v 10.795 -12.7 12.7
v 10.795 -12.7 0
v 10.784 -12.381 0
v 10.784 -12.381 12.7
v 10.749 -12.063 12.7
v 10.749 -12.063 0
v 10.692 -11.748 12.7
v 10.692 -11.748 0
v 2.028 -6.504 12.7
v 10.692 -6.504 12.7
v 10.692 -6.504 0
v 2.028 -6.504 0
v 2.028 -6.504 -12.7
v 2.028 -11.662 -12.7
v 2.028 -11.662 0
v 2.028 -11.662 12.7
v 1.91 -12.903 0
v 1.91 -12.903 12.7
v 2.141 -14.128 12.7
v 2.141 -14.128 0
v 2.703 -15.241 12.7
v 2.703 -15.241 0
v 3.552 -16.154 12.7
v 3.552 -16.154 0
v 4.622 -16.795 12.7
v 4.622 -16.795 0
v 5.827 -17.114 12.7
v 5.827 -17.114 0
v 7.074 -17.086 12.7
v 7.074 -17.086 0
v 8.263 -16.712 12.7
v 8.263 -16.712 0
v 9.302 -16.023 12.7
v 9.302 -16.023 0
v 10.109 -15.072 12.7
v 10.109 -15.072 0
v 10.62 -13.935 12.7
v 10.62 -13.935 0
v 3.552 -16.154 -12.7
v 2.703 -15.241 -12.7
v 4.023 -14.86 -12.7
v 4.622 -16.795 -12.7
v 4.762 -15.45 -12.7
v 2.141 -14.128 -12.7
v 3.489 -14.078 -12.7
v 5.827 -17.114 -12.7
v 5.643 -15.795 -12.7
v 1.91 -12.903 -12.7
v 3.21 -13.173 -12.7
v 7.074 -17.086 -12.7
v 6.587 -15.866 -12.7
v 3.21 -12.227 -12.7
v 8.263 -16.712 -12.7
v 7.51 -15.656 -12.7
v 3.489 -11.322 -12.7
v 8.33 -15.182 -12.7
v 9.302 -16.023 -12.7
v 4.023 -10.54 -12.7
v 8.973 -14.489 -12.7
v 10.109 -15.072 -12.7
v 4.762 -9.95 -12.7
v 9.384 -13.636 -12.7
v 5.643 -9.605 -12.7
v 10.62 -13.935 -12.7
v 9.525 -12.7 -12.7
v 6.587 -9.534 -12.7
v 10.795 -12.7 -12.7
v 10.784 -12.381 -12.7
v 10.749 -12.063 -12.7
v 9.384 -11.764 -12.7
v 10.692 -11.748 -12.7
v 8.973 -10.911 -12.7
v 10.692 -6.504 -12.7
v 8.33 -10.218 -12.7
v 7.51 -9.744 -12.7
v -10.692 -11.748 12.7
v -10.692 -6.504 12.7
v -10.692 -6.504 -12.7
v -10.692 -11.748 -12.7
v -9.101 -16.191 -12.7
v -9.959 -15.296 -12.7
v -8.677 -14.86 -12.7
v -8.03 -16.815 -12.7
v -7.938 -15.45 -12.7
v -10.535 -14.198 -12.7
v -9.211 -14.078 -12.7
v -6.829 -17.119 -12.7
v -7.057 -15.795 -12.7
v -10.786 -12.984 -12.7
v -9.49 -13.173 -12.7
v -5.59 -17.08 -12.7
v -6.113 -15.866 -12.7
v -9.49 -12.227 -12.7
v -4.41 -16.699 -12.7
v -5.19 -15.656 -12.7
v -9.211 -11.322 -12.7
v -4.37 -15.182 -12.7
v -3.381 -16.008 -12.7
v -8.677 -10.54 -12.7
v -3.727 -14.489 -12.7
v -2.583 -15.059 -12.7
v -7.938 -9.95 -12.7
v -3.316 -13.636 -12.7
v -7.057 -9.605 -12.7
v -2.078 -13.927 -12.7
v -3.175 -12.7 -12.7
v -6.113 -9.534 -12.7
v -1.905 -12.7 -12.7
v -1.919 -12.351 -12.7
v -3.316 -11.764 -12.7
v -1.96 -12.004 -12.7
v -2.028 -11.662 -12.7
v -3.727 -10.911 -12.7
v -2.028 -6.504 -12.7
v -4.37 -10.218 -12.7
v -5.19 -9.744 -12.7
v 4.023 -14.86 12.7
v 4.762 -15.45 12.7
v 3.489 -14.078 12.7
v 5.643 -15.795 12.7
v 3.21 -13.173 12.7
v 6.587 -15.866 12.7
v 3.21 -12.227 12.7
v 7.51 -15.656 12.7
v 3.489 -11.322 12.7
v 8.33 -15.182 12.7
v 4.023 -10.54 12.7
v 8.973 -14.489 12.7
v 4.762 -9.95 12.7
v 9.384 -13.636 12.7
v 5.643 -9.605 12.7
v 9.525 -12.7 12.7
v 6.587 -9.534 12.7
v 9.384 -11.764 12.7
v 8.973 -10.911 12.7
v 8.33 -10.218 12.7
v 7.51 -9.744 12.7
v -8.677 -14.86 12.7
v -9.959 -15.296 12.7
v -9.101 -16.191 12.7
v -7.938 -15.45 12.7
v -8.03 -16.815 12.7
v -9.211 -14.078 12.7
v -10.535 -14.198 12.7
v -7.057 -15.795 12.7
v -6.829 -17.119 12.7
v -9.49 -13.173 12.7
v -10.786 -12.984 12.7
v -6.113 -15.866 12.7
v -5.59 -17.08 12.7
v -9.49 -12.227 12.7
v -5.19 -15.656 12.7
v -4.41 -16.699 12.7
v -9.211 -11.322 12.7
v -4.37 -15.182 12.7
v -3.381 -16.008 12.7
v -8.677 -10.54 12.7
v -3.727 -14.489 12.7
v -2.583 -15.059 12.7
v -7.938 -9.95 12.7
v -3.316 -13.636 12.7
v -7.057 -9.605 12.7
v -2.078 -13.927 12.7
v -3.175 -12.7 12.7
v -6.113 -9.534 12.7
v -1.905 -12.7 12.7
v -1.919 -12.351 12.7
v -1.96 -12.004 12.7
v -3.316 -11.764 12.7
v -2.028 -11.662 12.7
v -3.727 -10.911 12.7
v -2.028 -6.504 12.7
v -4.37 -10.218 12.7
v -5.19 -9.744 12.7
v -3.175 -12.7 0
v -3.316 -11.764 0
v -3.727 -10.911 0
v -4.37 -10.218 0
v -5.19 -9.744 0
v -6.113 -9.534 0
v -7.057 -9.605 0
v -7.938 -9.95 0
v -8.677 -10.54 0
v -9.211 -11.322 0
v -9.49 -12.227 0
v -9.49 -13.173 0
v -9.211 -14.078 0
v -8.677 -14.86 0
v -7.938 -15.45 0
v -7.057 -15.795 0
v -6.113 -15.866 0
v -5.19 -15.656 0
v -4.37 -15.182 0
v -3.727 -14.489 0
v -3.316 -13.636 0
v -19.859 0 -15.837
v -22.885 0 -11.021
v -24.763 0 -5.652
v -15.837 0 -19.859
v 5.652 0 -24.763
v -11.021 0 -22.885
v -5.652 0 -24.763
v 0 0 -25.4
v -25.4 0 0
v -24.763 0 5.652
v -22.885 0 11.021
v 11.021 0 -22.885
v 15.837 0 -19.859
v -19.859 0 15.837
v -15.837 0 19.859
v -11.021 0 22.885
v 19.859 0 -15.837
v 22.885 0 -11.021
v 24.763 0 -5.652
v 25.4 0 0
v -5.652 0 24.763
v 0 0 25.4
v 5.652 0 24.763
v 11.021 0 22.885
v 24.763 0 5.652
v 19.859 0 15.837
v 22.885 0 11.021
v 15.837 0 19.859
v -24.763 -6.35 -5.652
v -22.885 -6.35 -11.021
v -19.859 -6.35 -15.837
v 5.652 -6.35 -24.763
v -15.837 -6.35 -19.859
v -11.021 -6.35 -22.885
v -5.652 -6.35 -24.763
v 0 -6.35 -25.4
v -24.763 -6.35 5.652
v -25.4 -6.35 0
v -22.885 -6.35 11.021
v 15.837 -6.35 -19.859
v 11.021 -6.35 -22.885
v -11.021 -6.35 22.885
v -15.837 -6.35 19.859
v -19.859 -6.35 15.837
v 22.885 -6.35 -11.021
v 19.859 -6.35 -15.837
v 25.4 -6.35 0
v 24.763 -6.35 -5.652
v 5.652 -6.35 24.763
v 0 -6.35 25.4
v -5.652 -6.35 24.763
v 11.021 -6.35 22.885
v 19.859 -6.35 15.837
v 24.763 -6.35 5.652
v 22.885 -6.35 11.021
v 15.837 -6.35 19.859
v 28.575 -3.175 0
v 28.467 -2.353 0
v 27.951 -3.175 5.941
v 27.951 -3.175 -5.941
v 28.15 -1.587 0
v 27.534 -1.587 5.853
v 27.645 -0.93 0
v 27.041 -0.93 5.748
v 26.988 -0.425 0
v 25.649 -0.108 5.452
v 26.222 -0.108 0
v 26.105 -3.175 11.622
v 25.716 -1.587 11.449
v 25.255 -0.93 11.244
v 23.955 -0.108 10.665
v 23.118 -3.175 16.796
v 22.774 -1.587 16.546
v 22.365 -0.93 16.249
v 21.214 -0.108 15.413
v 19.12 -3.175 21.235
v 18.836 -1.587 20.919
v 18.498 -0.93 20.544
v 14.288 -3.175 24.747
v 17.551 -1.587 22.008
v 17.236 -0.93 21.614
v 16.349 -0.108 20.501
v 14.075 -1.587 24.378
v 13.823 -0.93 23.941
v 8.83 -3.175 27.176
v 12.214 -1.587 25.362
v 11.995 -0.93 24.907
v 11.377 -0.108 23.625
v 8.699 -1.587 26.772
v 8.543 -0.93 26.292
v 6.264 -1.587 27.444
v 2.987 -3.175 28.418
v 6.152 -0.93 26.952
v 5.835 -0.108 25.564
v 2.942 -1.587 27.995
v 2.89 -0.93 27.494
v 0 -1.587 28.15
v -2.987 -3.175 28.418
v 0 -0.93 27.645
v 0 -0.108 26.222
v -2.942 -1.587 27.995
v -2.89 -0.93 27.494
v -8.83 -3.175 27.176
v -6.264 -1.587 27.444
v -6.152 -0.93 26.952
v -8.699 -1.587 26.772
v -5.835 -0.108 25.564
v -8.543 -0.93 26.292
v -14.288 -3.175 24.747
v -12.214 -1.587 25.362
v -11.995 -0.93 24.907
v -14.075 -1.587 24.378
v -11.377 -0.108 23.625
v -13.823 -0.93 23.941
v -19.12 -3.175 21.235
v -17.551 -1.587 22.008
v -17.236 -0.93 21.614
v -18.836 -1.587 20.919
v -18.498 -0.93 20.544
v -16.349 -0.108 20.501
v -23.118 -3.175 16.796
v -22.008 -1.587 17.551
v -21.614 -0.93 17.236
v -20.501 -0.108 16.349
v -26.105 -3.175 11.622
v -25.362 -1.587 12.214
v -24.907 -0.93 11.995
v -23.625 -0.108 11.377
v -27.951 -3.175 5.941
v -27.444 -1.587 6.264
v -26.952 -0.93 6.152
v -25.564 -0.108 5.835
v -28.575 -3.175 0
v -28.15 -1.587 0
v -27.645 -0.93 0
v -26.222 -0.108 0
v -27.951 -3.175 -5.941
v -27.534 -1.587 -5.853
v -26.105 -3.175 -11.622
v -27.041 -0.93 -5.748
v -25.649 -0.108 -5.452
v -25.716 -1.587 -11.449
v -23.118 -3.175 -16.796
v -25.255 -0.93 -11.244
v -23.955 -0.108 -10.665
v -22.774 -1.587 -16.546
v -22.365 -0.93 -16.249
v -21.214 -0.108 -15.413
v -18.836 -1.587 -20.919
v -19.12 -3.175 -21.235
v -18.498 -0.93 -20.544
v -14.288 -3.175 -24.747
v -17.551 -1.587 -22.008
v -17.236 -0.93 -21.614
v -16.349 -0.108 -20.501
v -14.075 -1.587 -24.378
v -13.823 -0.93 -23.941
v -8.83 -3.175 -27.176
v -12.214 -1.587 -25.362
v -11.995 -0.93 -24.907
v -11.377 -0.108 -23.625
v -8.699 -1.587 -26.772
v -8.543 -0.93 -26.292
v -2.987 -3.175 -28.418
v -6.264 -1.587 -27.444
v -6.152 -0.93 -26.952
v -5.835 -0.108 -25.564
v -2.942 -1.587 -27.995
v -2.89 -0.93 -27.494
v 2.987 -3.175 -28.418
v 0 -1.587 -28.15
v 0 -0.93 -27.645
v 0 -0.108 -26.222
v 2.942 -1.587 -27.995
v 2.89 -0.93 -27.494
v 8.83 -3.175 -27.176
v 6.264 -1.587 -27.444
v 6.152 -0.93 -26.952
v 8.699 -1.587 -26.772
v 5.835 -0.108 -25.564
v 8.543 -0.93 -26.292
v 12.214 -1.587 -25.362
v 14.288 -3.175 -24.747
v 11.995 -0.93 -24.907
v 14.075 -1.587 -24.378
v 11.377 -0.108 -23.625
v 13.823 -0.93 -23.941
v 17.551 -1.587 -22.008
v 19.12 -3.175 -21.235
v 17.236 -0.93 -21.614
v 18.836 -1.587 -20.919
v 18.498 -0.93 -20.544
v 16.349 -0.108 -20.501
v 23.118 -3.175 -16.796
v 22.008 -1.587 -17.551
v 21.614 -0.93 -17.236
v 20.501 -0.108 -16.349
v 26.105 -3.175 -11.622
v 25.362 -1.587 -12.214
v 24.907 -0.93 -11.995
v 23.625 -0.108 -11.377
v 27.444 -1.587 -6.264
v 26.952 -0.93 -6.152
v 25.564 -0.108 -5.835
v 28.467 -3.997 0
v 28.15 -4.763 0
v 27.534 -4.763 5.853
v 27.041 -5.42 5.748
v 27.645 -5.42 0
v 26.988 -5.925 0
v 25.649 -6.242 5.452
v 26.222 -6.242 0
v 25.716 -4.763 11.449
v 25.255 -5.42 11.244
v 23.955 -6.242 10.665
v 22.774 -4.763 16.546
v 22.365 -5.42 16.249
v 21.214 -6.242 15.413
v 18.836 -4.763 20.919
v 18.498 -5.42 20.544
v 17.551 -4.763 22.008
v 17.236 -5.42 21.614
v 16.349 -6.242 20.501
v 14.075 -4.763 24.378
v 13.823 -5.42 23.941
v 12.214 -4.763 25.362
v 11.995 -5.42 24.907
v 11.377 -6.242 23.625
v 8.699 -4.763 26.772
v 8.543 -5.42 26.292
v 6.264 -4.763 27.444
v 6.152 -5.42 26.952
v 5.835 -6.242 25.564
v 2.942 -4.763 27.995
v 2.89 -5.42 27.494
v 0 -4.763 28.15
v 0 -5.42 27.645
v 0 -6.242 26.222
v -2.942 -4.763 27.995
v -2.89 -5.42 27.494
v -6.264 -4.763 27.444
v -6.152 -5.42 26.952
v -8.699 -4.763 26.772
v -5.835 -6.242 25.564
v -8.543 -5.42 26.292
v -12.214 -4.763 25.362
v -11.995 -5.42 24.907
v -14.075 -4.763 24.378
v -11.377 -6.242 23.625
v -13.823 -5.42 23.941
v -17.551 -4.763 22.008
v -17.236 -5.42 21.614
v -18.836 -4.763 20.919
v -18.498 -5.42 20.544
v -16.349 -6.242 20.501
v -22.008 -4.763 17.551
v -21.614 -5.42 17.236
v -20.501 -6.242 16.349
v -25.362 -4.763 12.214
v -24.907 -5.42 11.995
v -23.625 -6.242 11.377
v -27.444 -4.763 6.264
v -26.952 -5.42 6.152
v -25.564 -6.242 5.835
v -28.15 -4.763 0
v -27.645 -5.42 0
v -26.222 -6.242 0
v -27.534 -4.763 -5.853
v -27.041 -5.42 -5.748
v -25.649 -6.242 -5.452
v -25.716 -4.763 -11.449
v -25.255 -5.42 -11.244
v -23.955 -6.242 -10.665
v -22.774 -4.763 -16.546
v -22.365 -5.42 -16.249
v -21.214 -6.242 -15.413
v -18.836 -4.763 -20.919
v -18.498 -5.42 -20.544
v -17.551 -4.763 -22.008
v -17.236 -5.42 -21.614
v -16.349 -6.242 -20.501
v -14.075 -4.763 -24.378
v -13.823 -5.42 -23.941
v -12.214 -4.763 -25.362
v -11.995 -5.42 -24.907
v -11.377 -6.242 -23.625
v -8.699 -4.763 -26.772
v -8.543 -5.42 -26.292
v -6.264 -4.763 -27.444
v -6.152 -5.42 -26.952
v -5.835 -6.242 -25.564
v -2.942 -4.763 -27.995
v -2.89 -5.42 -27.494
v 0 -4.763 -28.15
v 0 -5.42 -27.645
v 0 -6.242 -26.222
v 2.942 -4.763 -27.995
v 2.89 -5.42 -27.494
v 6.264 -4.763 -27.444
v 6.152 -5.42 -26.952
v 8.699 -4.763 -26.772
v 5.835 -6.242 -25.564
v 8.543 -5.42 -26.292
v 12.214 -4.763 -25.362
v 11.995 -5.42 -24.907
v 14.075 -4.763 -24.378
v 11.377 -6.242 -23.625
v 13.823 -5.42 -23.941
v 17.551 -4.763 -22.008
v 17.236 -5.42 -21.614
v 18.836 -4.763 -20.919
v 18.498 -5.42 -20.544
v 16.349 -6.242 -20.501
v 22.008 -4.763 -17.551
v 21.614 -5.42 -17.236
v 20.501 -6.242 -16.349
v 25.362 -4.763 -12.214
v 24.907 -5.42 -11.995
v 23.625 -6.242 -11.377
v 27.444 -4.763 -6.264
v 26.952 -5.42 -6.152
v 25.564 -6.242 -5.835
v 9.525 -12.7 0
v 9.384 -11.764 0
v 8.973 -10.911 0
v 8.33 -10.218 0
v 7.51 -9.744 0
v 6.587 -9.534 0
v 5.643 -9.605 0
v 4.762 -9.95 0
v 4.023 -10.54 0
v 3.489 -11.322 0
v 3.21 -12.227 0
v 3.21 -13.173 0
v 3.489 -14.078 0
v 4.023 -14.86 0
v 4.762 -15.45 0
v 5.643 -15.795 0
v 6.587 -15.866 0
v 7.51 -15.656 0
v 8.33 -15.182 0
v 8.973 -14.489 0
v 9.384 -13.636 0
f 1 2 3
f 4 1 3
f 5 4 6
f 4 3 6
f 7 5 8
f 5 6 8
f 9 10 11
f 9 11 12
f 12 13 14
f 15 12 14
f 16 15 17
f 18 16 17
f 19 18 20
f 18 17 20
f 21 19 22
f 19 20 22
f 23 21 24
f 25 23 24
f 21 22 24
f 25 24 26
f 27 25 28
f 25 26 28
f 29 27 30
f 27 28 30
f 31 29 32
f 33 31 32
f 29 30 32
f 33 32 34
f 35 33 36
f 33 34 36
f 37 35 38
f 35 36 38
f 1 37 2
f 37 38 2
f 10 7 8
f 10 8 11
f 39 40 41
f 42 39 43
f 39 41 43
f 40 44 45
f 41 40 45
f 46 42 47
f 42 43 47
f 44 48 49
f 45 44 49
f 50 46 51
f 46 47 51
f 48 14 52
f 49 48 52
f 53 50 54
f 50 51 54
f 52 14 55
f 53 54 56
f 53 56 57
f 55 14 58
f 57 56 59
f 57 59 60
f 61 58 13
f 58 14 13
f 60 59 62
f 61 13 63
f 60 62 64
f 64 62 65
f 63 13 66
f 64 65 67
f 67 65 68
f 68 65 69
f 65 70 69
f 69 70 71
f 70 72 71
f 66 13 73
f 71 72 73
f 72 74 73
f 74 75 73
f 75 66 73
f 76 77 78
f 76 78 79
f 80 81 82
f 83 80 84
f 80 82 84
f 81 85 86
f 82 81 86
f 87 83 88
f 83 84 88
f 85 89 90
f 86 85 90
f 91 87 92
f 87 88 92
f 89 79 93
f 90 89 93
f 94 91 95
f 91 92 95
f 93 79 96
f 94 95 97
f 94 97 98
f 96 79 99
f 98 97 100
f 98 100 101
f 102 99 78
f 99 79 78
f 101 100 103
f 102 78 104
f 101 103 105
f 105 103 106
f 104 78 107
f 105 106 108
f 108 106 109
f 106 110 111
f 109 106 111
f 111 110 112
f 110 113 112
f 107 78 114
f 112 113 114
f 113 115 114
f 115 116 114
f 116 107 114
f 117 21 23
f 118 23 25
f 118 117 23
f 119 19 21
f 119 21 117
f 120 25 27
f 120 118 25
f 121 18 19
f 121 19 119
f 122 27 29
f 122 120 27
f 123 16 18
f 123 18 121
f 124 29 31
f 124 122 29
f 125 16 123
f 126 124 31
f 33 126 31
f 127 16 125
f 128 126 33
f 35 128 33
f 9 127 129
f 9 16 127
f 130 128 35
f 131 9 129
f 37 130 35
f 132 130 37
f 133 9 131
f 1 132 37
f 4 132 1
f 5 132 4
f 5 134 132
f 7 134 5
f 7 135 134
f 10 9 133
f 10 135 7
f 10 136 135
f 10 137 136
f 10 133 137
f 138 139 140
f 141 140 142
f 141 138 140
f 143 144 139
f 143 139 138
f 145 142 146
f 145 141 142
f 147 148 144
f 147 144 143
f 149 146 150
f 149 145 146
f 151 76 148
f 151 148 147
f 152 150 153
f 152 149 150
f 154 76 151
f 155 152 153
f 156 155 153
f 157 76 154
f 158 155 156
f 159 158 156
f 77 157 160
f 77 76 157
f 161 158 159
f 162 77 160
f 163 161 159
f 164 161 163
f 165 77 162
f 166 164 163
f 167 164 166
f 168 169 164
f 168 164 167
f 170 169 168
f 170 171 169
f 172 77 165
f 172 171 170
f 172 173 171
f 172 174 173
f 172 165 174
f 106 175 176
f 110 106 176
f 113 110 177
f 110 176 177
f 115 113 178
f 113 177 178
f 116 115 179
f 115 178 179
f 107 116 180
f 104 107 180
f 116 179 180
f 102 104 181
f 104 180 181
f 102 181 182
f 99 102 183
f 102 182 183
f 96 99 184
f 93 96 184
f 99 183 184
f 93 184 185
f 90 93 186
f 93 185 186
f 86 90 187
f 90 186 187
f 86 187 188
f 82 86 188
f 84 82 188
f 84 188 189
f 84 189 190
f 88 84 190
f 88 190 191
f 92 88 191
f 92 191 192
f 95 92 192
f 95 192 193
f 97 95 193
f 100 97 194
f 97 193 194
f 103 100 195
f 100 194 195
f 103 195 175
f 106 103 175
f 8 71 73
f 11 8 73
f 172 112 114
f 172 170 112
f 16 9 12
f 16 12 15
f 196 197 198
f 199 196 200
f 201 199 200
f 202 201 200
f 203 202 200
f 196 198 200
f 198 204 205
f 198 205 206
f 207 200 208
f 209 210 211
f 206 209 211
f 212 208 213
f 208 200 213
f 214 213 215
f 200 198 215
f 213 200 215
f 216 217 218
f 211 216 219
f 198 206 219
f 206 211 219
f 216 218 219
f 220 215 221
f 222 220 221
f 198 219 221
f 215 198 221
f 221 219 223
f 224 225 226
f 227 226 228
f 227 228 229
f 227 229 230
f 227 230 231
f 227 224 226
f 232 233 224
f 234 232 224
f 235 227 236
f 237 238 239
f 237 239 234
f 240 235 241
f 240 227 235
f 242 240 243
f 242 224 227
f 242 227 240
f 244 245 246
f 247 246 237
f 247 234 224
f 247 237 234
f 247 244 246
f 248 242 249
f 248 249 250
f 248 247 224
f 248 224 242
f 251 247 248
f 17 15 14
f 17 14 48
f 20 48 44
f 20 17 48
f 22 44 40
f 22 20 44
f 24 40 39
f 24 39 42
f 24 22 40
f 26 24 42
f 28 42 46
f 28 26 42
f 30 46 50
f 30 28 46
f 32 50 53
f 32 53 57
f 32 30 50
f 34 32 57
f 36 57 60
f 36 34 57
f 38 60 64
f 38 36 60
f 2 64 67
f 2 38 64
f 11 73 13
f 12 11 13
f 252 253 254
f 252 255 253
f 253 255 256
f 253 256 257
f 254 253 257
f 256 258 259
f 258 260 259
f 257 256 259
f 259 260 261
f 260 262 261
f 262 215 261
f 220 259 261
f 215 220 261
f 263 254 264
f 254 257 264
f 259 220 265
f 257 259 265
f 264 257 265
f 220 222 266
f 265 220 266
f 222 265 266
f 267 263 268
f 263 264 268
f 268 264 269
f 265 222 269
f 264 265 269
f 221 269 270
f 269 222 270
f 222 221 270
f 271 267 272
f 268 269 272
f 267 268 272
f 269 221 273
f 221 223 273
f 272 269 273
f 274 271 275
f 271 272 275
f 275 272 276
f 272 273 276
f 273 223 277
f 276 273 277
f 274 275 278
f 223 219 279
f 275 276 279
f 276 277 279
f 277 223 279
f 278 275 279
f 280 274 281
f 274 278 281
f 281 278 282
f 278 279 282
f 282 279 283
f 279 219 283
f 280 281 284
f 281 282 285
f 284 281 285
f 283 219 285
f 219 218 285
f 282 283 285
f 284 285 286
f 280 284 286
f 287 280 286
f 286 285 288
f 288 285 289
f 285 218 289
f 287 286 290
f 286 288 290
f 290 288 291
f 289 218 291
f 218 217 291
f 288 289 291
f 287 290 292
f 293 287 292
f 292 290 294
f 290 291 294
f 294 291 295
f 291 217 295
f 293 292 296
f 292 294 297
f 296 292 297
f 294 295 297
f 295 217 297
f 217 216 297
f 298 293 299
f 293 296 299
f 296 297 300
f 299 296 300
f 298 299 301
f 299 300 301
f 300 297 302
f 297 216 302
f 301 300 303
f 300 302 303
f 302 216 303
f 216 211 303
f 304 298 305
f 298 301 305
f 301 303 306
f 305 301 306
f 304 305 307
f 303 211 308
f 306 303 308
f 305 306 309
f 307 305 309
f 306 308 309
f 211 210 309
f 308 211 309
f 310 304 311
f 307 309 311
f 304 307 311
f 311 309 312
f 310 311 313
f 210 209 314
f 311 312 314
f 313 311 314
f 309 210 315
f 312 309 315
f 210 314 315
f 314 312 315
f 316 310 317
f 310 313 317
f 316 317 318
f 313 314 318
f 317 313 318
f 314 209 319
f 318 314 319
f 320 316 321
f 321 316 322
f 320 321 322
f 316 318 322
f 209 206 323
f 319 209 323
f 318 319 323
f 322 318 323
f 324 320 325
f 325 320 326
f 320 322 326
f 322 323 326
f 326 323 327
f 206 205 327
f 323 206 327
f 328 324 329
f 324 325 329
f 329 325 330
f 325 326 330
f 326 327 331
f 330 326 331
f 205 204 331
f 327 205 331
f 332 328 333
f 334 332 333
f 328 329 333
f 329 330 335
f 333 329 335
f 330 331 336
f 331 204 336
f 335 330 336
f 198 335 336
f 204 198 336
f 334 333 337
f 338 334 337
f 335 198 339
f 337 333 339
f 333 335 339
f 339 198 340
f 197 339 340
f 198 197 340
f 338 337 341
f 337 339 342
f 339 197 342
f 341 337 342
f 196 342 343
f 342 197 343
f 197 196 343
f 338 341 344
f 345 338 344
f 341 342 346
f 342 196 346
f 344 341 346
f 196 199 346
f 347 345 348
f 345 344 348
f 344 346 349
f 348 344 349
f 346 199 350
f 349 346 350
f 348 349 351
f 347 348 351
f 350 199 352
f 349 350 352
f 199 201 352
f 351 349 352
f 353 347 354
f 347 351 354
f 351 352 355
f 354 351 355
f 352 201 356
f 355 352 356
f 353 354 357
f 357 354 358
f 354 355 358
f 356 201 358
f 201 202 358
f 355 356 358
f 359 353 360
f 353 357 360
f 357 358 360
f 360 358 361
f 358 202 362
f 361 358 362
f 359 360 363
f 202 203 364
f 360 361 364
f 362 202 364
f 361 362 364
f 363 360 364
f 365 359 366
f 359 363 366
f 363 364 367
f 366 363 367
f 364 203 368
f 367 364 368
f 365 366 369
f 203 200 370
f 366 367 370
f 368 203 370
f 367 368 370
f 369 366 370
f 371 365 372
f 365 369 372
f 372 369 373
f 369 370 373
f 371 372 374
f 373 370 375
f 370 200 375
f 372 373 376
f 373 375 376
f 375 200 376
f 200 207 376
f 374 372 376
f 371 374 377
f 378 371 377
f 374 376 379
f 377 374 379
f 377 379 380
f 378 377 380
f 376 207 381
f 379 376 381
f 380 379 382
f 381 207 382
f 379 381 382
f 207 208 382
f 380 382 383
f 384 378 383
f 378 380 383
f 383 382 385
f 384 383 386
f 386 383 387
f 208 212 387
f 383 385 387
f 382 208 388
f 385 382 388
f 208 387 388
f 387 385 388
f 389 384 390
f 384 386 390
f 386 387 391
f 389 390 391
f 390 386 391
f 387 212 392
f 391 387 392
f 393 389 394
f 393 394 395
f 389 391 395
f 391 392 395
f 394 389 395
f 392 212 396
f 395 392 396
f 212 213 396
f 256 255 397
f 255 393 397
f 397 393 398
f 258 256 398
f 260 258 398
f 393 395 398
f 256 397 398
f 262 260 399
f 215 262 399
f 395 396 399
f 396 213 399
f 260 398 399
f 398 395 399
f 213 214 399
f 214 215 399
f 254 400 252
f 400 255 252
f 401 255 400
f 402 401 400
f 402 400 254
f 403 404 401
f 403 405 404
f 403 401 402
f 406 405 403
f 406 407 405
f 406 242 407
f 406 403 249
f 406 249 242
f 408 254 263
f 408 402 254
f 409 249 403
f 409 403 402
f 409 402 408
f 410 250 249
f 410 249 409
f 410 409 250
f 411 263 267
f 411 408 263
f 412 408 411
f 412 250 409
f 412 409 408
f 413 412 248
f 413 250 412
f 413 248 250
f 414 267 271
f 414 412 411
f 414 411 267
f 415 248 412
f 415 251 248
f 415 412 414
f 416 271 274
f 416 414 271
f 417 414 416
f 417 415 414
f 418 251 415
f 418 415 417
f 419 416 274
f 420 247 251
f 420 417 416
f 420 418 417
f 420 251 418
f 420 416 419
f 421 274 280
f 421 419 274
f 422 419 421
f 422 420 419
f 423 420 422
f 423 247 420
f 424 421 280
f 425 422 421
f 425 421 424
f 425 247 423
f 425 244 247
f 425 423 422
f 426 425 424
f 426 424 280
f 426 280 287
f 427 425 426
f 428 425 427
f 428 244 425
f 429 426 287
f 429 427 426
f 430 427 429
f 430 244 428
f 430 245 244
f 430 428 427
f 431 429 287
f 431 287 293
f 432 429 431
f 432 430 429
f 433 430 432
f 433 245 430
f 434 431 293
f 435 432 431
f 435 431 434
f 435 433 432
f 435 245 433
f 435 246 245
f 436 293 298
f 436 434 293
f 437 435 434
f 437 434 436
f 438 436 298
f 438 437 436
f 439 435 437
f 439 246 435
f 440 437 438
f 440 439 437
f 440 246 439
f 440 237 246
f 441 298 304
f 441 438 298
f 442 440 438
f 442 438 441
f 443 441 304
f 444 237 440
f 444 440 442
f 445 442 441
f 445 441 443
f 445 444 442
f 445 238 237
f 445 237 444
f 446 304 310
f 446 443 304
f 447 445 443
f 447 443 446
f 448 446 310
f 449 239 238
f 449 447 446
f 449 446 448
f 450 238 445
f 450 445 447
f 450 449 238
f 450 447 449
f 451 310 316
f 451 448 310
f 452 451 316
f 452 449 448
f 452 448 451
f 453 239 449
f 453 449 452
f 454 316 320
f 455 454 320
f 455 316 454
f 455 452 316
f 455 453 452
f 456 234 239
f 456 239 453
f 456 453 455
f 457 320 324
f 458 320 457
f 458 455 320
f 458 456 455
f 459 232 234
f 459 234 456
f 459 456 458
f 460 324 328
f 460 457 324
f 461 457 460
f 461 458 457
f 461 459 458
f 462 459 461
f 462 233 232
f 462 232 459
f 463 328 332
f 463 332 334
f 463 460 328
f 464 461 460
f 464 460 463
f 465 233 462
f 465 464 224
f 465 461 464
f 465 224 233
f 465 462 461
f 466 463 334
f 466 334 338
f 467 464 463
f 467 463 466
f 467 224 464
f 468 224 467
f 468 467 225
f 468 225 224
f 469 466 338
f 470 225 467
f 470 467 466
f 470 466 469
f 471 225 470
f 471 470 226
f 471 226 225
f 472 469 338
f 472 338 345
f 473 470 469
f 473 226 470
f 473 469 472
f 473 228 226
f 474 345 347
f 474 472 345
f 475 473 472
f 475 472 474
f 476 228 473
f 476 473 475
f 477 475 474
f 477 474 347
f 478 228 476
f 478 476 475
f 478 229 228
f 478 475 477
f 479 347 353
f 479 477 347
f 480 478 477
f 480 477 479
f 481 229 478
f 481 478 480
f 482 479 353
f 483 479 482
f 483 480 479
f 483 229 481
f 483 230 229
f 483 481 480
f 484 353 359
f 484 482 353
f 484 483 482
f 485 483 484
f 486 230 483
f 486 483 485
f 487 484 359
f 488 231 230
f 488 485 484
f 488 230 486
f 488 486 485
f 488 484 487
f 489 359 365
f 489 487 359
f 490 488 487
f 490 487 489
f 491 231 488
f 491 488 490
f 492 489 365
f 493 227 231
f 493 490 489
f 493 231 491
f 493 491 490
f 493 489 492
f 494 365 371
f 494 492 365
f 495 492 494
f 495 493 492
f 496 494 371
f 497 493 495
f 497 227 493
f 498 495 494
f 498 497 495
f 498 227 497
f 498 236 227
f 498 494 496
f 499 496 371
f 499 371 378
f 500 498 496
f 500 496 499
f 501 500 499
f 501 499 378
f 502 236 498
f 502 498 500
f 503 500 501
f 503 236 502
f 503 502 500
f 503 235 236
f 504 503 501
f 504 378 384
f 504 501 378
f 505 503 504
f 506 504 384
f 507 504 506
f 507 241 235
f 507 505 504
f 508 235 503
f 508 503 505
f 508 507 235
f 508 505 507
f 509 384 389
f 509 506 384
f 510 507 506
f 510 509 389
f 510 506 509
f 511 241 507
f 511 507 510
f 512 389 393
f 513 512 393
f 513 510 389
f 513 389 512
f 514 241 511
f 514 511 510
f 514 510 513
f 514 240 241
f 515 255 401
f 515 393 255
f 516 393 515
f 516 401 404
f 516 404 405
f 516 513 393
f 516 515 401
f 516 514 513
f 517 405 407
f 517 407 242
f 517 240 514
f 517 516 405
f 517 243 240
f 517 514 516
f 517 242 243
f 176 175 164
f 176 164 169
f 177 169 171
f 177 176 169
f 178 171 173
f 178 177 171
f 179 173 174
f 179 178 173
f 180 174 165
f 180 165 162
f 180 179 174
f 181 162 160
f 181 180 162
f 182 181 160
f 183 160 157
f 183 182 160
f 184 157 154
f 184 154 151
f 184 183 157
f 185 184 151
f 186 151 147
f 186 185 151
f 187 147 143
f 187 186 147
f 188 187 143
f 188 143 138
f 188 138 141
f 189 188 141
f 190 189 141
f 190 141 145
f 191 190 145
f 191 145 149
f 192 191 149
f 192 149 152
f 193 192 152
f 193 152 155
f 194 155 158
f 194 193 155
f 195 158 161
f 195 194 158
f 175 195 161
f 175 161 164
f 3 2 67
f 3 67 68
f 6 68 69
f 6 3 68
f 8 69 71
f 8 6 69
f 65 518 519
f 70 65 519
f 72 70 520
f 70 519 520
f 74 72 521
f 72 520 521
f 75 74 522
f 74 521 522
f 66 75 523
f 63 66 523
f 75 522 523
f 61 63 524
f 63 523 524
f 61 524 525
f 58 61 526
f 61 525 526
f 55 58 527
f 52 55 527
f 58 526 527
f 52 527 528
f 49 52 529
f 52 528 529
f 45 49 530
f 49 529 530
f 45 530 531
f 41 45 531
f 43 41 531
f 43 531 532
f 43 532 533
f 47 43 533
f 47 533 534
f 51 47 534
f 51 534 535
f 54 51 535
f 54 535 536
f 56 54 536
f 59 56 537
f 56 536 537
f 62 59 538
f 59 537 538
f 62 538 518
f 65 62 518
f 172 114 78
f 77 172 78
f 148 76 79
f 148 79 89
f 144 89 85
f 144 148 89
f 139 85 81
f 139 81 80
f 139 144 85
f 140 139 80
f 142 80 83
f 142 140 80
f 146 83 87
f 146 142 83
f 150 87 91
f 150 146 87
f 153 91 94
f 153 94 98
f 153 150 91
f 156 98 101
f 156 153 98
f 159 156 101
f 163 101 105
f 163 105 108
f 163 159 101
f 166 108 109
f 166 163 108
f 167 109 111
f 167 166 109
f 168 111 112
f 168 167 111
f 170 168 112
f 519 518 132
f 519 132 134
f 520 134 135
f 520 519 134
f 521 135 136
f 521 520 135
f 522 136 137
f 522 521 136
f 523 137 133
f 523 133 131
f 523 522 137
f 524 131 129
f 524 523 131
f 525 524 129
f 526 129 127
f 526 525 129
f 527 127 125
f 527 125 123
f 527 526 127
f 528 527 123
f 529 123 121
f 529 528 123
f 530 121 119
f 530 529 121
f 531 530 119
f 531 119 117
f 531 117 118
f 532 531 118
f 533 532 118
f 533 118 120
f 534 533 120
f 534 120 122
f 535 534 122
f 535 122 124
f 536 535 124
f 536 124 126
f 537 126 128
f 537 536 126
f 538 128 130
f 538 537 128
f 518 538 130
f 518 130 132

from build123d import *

# Parameters (mm, degrees)
F0_R          = 28.575
F1_DEPTH      = 6.35
F2_R          = 3.17499
F3_R          = 3.175
F4_DEPTH      = 12.7
F4_DEPTH_BACK = 12.7


# Not quite as in the source:
# - a fillet or chamfer is up to 0.001 mm smaller than in the source, because OpenCascade refuses the exact size


with BuildPart() as f1:
    # F0 (on Front) → F1 (new body)
    with BuildSketch(Plane.XZ):
        Circle(F0_R)
    extrude(amount=F1_DEPTH)

    # F2 (radius 3.175 in the source; OpenCascade refuses exactly that, so slightly less here)
    f2_edges = [f1.edges().sort_by_distance(p)[0] for p in [
        (-28.575, -6.35, 0),
        (28.575, -3.175, 0),
        (-28.575, 0, 0),
    ]]
    fillet(f2_edges, radius=F2_R)


with BuildPart() as f4:
    # F3 (on Top) → F4 (new body, two sides)
    with BuildSketch(Plane.XY) as f4_sk:
        with BuildLine():
            ThreePointArc((2.0279974168, -11.6615787604), (5.8271599108, -17.1141435456), (10.795, -12.7))
            ThreePointArc((10.795, -12.7), (10.7691479997, -12.2212976328), (10.691892708, -11.7481635057))
            ThreePointArc((10.691892708, -11.7481635057), (6.3944199707, -8.2552219553), (2.0279974168, -11.6615787604))
        make_face()
        with Locations((6.35, -12.7)):
            Circle(F3_R, mode=Mode.SUBTRACT)
        with BuildLine():
            ThreePointArc((2.0279974168, -11.6615787604), (6.3944199707, -8.2552219553), (10.691892708, -11.7481635057))
            Line((10.691892708, -11.7481635057), (10.691892708, -6.5039667386))
            Line((10.691892708, -6.5039667386), (2.0279974168, -6.5039667386))
            Line((2.0279974168, -6.5039667386), (2.0279974168, -11.6615787604))
        make_face()
    extrude(amount=F4_DEPTH)
    extrude(f4_sk.sketch, amount=-F4_DEPTH_BACK)


with BuildPart() as f4b:
    # F3 (on Top) → F4, piece 2 (new body, two sides)
    with BuildSketch(Plane.XY) as f4_2_sk:
        with BuildLine():
            ThreePointArc((-10.691892708, -11.7481635057), (-6.3944199707, -8.2552219553), (-2.0279974168, -11.6615787604))
            Line((-2.0279974168, -11.6615787604), (-2.0279974168, -6.5039667386))
            Line((-2.0279974168, -6.5039667386), (-10.691892708, -6.5039667386))
            Line((-10.691892708, -6.5039667386), (-10.691892708, -11.7481635057))
        make_face()
        with BuildLine():
            ThreePointArc((-1.905, -12.7), (-1.9358564544, -12.1771599108), (-2.0279974168, -11.6615787604))
            ThreePointArc((-2.0279974168, -11.6615787604), (-6.3944199707, -8.2552219553), (-10.691892708, -11.7481635057))
            ThreePointArc((-10.691892708, -11.7481635057), (-6.8287023672, -17.1191479997), (-1.905, -12.7))
        make_face()
        with Locations((-6.35, -12.7)):
            Circle(F3_R, mode=Mode.SUBTRACT)
    extrude(amount=F4_DEPTH)
    extrude(f4_2_sk.sketch, amount=-F4_DEPTH_BACK)


solid = Compound([f1.part, f4.part, f4b.part])
